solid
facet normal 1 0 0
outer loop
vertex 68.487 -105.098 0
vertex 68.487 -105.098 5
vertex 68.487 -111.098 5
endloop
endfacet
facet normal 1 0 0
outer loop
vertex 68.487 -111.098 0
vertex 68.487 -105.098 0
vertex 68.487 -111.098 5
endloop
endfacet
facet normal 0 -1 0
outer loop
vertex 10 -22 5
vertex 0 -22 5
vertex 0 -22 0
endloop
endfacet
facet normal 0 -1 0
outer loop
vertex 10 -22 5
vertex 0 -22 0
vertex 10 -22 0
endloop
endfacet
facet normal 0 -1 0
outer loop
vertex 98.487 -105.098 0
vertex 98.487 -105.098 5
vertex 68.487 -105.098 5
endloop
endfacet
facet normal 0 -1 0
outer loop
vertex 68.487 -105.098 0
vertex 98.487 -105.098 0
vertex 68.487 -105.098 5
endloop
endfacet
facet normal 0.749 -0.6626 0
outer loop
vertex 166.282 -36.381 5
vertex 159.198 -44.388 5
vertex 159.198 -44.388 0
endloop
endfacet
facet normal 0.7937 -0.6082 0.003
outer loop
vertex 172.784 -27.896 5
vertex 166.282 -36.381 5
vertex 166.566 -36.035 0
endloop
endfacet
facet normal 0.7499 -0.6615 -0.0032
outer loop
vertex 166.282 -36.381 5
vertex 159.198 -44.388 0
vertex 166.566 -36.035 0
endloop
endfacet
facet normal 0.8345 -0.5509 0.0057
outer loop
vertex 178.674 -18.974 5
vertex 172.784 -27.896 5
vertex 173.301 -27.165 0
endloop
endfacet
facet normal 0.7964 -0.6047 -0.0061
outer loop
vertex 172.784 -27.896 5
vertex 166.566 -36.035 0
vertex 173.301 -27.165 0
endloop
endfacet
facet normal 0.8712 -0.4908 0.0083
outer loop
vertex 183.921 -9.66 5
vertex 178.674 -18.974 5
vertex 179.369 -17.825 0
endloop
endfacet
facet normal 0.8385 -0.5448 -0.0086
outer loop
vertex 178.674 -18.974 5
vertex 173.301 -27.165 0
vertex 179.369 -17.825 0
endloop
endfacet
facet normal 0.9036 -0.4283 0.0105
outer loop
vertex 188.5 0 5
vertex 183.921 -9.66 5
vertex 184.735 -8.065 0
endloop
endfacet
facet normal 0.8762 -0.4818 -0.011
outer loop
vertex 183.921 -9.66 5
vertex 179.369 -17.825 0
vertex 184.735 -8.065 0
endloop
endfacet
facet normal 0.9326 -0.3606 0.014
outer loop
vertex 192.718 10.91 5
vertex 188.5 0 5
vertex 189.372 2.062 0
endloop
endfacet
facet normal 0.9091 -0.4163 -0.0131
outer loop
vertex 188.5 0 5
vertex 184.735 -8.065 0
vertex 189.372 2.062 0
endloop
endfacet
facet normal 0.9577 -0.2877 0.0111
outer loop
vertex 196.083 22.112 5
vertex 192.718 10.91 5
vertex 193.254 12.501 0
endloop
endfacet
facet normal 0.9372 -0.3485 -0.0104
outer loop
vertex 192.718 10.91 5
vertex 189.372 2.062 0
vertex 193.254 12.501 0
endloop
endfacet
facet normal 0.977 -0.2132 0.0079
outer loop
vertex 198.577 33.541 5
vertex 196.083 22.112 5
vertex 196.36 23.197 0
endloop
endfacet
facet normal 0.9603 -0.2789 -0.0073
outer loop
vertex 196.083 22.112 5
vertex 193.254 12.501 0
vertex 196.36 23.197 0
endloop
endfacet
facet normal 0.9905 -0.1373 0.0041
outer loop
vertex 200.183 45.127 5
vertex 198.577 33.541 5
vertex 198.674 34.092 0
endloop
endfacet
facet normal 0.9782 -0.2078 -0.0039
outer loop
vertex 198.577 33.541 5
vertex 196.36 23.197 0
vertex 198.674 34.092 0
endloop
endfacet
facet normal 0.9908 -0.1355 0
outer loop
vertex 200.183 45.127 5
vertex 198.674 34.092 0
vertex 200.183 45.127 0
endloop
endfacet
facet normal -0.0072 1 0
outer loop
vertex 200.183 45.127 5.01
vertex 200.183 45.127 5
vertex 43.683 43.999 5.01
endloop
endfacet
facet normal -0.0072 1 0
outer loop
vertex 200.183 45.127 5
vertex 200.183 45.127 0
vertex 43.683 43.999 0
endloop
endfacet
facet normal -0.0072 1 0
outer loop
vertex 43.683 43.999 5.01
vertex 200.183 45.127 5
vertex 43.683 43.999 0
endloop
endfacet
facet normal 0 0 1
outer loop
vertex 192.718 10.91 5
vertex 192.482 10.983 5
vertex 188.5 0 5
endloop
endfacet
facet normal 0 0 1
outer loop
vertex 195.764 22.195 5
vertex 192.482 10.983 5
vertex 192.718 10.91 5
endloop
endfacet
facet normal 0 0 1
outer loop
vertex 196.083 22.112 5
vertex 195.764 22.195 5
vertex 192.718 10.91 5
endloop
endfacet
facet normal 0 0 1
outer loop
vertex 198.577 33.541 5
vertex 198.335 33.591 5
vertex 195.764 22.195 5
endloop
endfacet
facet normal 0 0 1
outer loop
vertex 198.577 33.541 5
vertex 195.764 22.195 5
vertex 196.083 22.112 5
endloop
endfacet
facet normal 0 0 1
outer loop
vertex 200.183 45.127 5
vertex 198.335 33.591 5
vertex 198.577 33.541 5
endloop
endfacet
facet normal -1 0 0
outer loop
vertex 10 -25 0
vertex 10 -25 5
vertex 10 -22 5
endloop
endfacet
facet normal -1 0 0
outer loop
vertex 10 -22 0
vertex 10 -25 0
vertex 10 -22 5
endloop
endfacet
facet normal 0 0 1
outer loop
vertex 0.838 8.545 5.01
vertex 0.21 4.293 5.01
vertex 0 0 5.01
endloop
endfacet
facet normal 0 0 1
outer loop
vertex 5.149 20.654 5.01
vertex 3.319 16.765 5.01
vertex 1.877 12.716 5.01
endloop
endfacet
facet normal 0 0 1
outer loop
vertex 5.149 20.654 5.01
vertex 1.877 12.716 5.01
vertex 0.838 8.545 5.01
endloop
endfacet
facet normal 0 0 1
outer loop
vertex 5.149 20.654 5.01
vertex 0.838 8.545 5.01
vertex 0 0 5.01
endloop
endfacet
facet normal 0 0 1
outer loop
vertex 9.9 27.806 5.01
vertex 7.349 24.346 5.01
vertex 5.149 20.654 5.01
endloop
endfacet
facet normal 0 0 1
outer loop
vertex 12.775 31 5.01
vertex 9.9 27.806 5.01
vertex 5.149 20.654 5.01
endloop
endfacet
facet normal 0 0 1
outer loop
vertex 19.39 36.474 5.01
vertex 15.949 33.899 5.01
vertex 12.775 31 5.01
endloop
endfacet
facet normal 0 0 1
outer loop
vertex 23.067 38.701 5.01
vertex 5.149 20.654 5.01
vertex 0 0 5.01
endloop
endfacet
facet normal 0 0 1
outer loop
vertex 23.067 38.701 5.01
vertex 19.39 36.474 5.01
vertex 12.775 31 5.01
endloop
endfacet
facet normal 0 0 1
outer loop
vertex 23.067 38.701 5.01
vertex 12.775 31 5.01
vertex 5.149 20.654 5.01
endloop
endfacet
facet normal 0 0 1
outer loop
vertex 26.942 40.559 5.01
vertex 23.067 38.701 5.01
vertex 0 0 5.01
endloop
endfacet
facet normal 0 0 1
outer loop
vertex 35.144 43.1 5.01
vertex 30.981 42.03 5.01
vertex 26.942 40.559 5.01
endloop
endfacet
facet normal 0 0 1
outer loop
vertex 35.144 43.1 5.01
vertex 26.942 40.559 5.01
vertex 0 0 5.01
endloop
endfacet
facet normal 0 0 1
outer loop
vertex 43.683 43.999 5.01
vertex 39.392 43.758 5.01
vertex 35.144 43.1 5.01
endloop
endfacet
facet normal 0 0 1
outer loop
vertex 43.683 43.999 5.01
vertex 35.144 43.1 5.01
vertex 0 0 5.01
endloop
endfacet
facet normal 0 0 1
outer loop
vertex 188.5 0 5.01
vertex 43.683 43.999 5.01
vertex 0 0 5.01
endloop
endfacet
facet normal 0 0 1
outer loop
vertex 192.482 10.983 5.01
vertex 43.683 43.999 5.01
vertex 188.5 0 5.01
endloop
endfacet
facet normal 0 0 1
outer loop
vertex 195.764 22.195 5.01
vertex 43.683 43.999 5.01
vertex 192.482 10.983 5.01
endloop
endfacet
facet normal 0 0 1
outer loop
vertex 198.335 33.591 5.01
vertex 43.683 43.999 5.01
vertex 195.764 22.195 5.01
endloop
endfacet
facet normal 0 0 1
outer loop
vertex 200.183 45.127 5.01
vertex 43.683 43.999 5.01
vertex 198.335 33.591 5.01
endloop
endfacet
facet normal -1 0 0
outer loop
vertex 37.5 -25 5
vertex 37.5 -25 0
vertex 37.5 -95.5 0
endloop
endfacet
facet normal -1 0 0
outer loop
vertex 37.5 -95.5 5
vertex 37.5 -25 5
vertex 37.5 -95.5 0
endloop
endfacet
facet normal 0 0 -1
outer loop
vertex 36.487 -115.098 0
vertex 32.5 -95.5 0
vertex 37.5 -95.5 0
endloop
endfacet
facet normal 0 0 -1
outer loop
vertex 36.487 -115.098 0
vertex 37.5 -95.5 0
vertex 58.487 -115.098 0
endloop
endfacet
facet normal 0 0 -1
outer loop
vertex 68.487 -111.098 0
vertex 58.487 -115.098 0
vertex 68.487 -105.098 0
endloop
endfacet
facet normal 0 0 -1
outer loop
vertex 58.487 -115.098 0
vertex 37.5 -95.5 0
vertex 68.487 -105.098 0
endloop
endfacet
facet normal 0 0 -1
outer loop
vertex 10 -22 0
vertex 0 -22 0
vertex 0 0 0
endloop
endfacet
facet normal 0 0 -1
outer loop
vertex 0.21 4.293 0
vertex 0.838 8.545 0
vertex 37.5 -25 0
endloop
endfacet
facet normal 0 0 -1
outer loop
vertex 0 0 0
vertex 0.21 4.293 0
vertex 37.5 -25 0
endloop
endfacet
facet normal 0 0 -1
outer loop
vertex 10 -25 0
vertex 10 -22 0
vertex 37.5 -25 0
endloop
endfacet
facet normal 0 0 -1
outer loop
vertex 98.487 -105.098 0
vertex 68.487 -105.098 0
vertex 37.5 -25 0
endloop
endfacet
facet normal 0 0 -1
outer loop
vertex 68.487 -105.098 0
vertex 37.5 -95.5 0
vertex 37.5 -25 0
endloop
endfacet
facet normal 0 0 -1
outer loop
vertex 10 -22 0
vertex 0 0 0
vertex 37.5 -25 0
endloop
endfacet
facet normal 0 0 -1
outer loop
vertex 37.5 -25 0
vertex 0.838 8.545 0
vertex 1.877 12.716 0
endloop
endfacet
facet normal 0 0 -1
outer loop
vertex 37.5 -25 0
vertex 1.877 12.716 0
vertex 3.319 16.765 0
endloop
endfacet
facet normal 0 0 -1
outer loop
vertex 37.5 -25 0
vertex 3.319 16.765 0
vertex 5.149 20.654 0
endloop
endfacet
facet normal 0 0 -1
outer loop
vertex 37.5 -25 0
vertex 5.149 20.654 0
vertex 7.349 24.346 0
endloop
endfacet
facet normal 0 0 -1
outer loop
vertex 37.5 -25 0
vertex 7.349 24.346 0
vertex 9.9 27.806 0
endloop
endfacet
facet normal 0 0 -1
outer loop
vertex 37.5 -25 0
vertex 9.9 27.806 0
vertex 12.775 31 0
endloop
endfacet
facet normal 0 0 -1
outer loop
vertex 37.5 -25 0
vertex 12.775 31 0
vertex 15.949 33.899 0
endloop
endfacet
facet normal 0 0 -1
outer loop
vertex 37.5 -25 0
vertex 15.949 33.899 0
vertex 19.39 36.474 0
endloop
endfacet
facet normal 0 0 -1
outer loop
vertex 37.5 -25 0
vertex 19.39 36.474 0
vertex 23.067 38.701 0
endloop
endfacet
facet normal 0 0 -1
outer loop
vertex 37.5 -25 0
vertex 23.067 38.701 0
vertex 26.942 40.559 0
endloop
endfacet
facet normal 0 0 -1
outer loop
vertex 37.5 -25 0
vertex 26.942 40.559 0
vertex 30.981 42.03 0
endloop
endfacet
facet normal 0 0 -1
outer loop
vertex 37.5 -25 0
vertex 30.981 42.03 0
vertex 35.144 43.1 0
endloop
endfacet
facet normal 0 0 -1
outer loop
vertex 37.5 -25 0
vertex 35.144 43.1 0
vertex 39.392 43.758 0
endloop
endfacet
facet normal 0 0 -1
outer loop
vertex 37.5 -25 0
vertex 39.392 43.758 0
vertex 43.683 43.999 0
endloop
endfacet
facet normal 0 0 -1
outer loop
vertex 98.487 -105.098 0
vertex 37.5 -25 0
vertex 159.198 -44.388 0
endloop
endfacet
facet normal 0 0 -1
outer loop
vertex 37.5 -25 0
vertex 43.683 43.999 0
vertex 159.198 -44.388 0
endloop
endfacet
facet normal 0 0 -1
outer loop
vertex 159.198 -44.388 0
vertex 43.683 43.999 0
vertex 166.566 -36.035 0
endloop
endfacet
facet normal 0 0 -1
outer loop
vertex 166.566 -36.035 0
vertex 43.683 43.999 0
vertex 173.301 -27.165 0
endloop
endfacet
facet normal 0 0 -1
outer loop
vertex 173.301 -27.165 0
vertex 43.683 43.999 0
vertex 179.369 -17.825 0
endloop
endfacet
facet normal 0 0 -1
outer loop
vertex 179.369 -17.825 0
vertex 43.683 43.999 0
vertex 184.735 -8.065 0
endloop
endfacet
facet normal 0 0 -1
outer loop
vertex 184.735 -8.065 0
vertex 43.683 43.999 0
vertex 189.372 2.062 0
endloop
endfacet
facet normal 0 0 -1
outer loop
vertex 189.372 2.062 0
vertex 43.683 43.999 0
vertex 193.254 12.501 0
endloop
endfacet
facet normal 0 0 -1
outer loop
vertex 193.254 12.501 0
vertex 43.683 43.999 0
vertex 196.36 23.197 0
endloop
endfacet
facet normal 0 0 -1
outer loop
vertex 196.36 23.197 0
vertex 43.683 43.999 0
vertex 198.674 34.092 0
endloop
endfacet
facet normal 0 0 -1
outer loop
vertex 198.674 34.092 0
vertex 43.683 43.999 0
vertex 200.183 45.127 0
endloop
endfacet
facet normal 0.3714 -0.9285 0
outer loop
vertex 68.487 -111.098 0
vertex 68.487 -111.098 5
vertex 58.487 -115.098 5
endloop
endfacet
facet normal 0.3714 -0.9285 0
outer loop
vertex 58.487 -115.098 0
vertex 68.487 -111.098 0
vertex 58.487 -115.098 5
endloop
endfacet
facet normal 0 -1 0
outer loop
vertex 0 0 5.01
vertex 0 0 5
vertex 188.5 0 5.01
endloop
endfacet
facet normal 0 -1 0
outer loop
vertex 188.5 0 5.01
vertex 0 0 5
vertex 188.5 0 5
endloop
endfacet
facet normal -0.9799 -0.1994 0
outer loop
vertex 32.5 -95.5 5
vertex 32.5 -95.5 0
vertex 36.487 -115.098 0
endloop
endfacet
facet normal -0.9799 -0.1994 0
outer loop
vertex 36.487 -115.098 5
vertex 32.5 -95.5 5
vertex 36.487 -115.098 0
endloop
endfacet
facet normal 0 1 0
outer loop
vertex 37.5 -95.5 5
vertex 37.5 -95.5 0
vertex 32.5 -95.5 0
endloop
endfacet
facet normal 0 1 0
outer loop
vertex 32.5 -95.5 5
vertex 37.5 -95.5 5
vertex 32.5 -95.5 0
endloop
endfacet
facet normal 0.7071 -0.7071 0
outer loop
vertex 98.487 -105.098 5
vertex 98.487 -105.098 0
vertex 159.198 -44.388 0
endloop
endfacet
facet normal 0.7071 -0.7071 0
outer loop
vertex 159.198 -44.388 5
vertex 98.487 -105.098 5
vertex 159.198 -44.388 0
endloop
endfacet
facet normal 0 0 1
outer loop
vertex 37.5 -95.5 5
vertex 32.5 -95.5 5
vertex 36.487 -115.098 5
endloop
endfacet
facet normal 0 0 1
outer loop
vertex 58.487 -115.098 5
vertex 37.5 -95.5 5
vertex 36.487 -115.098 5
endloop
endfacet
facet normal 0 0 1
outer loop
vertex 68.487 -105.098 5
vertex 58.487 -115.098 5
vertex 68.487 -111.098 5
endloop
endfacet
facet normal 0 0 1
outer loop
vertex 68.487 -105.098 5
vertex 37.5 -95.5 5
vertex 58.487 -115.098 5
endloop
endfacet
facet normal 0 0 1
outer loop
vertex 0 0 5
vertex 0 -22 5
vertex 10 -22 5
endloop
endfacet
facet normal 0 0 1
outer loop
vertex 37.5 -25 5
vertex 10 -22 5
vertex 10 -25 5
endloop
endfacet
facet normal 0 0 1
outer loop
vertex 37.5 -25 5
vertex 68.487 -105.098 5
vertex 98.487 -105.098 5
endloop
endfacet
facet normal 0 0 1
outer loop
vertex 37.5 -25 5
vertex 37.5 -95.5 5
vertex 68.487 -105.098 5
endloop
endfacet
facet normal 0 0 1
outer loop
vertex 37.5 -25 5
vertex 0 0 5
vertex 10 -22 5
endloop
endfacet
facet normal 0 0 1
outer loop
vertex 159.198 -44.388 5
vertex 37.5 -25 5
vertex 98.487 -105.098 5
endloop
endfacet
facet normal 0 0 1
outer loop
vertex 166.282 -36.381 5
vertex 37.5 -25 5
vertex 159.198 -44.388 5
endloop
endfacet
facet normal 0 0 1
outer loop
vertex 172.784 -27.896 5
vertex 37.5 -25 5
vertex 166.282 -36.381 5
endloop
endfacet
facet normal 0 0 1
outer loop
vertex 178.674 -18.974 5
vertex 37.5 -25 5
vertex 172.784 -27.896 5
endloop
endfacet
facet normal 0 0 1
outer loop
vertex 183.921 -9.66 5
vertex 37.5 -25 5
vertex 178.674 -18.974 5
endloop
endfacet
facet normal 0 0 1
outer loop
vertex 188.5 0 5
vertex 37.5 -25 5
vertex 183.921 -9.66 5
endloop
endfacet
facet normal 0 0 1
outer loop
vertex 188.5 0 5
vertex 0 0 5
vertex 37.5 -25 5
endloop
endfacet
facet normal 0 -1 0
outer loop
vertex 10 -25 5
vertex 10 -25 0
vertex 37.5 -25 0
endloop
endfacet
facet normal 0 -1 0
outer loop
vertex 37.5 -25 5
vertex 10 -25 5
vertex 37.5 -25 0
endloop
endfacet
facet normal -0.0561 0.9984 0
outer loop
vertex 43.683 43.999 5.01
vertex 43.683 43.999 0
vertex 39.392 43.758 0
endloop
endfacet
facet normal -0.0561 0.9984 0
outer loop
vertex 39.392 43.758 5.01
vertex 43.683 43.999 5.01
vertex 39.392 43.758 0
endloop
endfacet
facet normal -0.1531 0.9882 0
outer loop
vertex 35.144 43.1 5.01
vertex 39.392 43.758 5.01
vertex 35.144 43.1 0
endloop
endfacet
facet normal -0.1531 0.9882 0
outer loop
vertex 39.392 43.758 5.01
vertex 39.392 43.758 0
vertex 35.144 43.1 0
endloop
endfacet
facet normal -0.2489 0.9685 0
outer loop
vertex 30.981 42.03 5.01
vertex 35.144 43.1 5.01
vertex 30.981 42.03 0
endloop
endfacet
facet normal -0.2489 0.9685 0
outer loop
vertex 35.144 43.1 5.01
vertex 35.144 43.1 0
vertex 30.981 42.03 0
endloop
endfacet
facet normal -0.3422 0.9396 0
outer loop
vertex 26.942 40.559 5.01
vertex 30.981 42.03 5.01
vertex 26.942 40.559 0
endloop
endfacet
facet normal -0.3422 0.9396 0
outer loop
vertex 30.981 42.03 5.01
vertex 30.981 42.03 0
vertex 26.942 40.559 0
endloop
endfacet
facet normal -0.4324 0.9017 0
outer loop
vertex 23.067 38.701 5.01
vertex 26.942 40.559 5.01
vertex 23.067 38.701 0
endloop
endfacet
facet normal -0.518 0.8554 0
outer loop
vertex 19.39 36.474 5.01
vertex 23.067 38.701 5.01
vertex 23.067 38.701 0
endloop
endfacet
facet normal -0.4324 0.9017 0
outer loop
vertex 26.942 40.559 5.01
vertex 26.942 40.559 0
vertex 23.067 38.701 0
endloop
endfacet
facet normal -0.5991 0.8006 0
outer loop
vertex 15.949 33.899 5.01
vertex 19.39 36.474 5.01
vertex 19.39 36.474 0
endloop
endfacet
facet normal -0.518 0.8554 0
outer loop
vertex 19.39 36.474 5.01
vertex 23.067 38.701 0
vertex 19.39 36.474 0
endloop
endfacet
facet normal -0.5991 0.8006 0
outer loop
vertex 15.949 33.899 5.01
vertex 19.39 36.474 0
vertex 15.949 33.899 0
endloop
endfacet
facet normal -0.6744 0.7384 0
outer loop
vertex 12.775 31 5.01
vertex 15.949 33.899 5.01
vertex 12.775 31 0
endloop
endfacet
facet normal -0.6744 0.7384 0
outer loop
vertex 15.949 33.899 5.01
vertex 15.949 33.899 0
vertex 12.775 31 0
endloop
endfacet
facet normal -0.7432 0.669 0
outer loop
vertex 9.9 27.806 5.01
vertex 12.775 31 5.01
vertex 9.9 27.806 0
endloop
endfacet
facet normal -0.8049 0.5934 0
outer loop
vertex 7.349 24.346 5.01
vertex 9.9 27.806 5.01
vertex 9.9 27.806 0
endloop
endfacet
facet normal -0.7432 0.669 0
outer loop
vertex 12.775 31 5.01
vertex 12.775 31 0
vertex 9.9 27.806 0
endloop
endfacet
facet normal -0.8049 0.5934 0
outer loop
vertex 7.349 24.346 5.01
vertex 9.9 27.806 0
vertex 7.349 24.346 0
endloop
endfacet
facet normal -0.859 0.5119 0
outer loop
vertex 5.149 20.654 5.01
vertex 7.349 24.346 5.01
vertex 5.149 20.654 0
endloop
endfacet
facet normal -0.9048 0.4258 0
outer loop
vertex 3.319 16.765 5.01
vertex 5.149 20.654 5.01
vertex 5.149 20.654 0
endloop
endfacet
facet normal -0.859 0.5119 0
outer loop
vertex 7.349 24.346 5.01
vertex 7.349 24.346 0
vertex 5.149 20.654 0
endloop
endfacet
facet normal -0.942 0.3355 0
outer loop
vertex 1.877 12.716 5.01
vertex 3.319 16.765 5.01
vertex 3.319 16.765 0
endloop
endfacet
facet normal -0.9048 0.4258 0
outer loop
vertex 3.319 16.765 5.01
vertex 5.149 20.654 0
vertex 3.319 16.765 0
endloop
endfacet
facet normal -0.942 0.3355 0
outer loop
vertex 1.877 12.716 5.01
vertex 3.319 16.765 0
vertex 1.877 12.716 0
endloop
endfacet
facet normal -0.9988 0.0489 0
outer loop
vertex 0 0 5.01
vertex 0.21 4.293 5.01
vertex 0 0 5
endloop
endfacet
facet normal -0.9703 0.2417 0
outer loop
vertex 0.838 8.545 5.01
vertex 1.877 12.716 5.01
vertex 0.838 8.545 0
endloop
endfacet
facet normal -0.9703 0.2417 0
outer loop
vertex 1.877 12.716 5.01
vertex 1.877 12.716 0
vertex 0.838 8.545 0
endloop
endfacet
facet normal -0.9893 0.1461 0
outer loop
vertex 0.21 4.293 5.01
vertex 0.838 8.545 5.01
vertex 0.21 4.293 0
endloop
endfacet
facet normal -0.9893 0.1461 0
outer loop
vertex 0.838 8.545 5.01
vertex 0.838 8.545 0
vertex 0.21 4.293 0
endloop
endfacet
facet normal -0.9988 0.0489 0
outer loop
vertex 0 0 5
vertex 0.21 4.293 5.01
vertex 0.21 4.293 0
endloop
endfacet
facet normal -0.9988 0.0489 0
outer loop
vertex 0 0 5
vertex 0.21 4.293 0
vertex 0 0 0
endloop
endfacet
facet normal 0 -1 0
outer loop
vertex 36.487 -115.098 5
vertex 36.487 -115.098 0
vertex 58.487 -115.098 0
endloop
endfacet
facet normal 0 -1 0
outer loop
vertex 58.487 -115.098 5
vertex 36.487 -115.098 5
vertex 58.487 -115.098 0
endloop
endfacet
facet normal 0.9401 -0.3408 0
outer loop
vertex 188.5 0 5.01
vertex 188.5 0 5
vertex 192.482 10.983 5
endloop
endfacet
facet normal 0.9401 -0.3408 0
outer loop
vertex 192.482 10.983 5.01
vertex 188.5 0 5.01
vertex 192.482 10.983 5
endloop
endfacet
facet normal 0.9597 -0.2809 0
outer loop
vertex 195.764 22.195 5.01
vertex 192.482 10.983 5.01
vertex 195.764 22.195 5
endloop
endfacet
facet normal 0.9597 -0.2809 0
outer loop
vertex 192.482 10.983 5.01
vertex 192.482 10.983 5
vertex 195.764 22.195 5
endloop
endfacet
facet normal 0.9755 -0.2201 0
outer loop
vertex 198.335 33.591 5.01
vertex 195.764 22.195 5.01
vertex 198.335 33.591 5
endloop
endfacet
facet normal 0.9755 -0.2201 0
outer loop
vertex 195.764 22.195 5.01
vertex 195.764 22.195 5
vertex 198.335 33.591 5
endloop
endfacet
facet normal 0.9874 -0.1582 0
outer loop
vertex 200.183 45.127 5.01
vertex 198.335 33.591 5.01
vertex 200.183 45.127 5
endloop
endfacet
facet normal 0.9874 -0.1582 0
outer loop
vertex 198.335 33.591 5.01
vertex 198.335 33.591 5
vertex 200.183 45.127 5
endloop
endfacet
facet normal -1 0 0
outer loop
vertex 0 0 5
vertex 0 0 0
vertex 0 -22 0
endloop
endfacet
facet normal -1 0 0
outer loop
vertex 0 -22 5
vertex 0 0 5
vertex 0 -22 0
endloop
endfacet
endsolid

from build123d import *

# Parameters (mm, degrees)
BOSS_EXTRU_1_DEPTH      = 5
BOSS_EXTRU_2_DEPTH      = 0.01
ESQUISSE3_W             = 10
ESQUISSE3_H             = 3
ENL_V_MAT_EXTRU_1_DEPTH = 231.967242256
ENL_V_MAT_EXTRU_2_DEPTH = 231.967242256


with BuildPart() as part:
    # Esquisse1 → Boss.-Extru.1 (new body)
    with BuildSketch(Plane.XY):
        with BuildLine():
            Line((0, 0), (0, -25))
            Line((0, -25), (37.5, -25))
            Line((37.5, -25), (37.5, -95.5))
            Line((37.5, -95.5), (32.5, -95.5))
            Line((32.5, -95.5), (36.487358688, -115.098494092))
            Line((36.487358688, -115.098494092), (88.487358688, -115.098494092))
            Line((88.487358688, -115.098494092), (159.198036807, -44.387815974))
            ThreePointArc((159.198036807, -44.387815974), (187.146342861, -3.044299659), (200.182925478, 45.126663235))
            Line((200.182925478, 45.126663235), (43.682925478, 43.998857528))
            ThreePointArc((43.682925478, 43.998857528), (12.775400091, 31.000392909), (0, 0))
        make_face()
    extrude(amount=BOSS_EXTRU_1_DEPTH)

    # Esquisse2 → Boss.-Extru.2 (add)
    with BuildSketch(Plane.XY.offset(5)):
        with BuildLine():
            Line((0, 0), (188.5, 0))
            ThreePointArc((188.5, 0), (195.764398976, 22.194945018), (200.182925478, 45.126663235))
            Line((200.182925478, 45.126663235), (43.682925478, 43.998857528))
            ThreePointArc((43.682925478, 43.998857528), (12.775400091, 31.000392909), (0, 0))
        make_face()
    extrude(amount=BOSS_EXTRU_2_DEPTH)

    # Esquisse3 → Enlèv. mat.-Extru.1 (cut, through all)
    with BuildSketch(Plane.XY.offset(5)):
        with Locations((5, -23.5)):
            Rectangle(ESQUISSE3_W, ESQUISSE3_H)
    extrude(amount=-ENL_V_MAT_EXTRU_1_DEPTH, mode=Mode.SUBTRACT)

    # Esquisse4 → Enlèv. mat.-Extru.2 (cut, through all)
    with BuildSketch(Plane.XY.offset(5)):
        Polygon((88.487358688, -105.098494092), (68.487358688, -105.098494092), (68.487358688, -111.098494092), (58.487358688, -115.098494092), (68.487358688, -115.098494092), (88.487358688, -115.098494092), (98.487358688, -105.098494092), align=None)
    extrude(amount=-ENL_V_MAT_EXTRU_2_DEPTH, mode=Mode.SUBTRACT)


solid = part.part
